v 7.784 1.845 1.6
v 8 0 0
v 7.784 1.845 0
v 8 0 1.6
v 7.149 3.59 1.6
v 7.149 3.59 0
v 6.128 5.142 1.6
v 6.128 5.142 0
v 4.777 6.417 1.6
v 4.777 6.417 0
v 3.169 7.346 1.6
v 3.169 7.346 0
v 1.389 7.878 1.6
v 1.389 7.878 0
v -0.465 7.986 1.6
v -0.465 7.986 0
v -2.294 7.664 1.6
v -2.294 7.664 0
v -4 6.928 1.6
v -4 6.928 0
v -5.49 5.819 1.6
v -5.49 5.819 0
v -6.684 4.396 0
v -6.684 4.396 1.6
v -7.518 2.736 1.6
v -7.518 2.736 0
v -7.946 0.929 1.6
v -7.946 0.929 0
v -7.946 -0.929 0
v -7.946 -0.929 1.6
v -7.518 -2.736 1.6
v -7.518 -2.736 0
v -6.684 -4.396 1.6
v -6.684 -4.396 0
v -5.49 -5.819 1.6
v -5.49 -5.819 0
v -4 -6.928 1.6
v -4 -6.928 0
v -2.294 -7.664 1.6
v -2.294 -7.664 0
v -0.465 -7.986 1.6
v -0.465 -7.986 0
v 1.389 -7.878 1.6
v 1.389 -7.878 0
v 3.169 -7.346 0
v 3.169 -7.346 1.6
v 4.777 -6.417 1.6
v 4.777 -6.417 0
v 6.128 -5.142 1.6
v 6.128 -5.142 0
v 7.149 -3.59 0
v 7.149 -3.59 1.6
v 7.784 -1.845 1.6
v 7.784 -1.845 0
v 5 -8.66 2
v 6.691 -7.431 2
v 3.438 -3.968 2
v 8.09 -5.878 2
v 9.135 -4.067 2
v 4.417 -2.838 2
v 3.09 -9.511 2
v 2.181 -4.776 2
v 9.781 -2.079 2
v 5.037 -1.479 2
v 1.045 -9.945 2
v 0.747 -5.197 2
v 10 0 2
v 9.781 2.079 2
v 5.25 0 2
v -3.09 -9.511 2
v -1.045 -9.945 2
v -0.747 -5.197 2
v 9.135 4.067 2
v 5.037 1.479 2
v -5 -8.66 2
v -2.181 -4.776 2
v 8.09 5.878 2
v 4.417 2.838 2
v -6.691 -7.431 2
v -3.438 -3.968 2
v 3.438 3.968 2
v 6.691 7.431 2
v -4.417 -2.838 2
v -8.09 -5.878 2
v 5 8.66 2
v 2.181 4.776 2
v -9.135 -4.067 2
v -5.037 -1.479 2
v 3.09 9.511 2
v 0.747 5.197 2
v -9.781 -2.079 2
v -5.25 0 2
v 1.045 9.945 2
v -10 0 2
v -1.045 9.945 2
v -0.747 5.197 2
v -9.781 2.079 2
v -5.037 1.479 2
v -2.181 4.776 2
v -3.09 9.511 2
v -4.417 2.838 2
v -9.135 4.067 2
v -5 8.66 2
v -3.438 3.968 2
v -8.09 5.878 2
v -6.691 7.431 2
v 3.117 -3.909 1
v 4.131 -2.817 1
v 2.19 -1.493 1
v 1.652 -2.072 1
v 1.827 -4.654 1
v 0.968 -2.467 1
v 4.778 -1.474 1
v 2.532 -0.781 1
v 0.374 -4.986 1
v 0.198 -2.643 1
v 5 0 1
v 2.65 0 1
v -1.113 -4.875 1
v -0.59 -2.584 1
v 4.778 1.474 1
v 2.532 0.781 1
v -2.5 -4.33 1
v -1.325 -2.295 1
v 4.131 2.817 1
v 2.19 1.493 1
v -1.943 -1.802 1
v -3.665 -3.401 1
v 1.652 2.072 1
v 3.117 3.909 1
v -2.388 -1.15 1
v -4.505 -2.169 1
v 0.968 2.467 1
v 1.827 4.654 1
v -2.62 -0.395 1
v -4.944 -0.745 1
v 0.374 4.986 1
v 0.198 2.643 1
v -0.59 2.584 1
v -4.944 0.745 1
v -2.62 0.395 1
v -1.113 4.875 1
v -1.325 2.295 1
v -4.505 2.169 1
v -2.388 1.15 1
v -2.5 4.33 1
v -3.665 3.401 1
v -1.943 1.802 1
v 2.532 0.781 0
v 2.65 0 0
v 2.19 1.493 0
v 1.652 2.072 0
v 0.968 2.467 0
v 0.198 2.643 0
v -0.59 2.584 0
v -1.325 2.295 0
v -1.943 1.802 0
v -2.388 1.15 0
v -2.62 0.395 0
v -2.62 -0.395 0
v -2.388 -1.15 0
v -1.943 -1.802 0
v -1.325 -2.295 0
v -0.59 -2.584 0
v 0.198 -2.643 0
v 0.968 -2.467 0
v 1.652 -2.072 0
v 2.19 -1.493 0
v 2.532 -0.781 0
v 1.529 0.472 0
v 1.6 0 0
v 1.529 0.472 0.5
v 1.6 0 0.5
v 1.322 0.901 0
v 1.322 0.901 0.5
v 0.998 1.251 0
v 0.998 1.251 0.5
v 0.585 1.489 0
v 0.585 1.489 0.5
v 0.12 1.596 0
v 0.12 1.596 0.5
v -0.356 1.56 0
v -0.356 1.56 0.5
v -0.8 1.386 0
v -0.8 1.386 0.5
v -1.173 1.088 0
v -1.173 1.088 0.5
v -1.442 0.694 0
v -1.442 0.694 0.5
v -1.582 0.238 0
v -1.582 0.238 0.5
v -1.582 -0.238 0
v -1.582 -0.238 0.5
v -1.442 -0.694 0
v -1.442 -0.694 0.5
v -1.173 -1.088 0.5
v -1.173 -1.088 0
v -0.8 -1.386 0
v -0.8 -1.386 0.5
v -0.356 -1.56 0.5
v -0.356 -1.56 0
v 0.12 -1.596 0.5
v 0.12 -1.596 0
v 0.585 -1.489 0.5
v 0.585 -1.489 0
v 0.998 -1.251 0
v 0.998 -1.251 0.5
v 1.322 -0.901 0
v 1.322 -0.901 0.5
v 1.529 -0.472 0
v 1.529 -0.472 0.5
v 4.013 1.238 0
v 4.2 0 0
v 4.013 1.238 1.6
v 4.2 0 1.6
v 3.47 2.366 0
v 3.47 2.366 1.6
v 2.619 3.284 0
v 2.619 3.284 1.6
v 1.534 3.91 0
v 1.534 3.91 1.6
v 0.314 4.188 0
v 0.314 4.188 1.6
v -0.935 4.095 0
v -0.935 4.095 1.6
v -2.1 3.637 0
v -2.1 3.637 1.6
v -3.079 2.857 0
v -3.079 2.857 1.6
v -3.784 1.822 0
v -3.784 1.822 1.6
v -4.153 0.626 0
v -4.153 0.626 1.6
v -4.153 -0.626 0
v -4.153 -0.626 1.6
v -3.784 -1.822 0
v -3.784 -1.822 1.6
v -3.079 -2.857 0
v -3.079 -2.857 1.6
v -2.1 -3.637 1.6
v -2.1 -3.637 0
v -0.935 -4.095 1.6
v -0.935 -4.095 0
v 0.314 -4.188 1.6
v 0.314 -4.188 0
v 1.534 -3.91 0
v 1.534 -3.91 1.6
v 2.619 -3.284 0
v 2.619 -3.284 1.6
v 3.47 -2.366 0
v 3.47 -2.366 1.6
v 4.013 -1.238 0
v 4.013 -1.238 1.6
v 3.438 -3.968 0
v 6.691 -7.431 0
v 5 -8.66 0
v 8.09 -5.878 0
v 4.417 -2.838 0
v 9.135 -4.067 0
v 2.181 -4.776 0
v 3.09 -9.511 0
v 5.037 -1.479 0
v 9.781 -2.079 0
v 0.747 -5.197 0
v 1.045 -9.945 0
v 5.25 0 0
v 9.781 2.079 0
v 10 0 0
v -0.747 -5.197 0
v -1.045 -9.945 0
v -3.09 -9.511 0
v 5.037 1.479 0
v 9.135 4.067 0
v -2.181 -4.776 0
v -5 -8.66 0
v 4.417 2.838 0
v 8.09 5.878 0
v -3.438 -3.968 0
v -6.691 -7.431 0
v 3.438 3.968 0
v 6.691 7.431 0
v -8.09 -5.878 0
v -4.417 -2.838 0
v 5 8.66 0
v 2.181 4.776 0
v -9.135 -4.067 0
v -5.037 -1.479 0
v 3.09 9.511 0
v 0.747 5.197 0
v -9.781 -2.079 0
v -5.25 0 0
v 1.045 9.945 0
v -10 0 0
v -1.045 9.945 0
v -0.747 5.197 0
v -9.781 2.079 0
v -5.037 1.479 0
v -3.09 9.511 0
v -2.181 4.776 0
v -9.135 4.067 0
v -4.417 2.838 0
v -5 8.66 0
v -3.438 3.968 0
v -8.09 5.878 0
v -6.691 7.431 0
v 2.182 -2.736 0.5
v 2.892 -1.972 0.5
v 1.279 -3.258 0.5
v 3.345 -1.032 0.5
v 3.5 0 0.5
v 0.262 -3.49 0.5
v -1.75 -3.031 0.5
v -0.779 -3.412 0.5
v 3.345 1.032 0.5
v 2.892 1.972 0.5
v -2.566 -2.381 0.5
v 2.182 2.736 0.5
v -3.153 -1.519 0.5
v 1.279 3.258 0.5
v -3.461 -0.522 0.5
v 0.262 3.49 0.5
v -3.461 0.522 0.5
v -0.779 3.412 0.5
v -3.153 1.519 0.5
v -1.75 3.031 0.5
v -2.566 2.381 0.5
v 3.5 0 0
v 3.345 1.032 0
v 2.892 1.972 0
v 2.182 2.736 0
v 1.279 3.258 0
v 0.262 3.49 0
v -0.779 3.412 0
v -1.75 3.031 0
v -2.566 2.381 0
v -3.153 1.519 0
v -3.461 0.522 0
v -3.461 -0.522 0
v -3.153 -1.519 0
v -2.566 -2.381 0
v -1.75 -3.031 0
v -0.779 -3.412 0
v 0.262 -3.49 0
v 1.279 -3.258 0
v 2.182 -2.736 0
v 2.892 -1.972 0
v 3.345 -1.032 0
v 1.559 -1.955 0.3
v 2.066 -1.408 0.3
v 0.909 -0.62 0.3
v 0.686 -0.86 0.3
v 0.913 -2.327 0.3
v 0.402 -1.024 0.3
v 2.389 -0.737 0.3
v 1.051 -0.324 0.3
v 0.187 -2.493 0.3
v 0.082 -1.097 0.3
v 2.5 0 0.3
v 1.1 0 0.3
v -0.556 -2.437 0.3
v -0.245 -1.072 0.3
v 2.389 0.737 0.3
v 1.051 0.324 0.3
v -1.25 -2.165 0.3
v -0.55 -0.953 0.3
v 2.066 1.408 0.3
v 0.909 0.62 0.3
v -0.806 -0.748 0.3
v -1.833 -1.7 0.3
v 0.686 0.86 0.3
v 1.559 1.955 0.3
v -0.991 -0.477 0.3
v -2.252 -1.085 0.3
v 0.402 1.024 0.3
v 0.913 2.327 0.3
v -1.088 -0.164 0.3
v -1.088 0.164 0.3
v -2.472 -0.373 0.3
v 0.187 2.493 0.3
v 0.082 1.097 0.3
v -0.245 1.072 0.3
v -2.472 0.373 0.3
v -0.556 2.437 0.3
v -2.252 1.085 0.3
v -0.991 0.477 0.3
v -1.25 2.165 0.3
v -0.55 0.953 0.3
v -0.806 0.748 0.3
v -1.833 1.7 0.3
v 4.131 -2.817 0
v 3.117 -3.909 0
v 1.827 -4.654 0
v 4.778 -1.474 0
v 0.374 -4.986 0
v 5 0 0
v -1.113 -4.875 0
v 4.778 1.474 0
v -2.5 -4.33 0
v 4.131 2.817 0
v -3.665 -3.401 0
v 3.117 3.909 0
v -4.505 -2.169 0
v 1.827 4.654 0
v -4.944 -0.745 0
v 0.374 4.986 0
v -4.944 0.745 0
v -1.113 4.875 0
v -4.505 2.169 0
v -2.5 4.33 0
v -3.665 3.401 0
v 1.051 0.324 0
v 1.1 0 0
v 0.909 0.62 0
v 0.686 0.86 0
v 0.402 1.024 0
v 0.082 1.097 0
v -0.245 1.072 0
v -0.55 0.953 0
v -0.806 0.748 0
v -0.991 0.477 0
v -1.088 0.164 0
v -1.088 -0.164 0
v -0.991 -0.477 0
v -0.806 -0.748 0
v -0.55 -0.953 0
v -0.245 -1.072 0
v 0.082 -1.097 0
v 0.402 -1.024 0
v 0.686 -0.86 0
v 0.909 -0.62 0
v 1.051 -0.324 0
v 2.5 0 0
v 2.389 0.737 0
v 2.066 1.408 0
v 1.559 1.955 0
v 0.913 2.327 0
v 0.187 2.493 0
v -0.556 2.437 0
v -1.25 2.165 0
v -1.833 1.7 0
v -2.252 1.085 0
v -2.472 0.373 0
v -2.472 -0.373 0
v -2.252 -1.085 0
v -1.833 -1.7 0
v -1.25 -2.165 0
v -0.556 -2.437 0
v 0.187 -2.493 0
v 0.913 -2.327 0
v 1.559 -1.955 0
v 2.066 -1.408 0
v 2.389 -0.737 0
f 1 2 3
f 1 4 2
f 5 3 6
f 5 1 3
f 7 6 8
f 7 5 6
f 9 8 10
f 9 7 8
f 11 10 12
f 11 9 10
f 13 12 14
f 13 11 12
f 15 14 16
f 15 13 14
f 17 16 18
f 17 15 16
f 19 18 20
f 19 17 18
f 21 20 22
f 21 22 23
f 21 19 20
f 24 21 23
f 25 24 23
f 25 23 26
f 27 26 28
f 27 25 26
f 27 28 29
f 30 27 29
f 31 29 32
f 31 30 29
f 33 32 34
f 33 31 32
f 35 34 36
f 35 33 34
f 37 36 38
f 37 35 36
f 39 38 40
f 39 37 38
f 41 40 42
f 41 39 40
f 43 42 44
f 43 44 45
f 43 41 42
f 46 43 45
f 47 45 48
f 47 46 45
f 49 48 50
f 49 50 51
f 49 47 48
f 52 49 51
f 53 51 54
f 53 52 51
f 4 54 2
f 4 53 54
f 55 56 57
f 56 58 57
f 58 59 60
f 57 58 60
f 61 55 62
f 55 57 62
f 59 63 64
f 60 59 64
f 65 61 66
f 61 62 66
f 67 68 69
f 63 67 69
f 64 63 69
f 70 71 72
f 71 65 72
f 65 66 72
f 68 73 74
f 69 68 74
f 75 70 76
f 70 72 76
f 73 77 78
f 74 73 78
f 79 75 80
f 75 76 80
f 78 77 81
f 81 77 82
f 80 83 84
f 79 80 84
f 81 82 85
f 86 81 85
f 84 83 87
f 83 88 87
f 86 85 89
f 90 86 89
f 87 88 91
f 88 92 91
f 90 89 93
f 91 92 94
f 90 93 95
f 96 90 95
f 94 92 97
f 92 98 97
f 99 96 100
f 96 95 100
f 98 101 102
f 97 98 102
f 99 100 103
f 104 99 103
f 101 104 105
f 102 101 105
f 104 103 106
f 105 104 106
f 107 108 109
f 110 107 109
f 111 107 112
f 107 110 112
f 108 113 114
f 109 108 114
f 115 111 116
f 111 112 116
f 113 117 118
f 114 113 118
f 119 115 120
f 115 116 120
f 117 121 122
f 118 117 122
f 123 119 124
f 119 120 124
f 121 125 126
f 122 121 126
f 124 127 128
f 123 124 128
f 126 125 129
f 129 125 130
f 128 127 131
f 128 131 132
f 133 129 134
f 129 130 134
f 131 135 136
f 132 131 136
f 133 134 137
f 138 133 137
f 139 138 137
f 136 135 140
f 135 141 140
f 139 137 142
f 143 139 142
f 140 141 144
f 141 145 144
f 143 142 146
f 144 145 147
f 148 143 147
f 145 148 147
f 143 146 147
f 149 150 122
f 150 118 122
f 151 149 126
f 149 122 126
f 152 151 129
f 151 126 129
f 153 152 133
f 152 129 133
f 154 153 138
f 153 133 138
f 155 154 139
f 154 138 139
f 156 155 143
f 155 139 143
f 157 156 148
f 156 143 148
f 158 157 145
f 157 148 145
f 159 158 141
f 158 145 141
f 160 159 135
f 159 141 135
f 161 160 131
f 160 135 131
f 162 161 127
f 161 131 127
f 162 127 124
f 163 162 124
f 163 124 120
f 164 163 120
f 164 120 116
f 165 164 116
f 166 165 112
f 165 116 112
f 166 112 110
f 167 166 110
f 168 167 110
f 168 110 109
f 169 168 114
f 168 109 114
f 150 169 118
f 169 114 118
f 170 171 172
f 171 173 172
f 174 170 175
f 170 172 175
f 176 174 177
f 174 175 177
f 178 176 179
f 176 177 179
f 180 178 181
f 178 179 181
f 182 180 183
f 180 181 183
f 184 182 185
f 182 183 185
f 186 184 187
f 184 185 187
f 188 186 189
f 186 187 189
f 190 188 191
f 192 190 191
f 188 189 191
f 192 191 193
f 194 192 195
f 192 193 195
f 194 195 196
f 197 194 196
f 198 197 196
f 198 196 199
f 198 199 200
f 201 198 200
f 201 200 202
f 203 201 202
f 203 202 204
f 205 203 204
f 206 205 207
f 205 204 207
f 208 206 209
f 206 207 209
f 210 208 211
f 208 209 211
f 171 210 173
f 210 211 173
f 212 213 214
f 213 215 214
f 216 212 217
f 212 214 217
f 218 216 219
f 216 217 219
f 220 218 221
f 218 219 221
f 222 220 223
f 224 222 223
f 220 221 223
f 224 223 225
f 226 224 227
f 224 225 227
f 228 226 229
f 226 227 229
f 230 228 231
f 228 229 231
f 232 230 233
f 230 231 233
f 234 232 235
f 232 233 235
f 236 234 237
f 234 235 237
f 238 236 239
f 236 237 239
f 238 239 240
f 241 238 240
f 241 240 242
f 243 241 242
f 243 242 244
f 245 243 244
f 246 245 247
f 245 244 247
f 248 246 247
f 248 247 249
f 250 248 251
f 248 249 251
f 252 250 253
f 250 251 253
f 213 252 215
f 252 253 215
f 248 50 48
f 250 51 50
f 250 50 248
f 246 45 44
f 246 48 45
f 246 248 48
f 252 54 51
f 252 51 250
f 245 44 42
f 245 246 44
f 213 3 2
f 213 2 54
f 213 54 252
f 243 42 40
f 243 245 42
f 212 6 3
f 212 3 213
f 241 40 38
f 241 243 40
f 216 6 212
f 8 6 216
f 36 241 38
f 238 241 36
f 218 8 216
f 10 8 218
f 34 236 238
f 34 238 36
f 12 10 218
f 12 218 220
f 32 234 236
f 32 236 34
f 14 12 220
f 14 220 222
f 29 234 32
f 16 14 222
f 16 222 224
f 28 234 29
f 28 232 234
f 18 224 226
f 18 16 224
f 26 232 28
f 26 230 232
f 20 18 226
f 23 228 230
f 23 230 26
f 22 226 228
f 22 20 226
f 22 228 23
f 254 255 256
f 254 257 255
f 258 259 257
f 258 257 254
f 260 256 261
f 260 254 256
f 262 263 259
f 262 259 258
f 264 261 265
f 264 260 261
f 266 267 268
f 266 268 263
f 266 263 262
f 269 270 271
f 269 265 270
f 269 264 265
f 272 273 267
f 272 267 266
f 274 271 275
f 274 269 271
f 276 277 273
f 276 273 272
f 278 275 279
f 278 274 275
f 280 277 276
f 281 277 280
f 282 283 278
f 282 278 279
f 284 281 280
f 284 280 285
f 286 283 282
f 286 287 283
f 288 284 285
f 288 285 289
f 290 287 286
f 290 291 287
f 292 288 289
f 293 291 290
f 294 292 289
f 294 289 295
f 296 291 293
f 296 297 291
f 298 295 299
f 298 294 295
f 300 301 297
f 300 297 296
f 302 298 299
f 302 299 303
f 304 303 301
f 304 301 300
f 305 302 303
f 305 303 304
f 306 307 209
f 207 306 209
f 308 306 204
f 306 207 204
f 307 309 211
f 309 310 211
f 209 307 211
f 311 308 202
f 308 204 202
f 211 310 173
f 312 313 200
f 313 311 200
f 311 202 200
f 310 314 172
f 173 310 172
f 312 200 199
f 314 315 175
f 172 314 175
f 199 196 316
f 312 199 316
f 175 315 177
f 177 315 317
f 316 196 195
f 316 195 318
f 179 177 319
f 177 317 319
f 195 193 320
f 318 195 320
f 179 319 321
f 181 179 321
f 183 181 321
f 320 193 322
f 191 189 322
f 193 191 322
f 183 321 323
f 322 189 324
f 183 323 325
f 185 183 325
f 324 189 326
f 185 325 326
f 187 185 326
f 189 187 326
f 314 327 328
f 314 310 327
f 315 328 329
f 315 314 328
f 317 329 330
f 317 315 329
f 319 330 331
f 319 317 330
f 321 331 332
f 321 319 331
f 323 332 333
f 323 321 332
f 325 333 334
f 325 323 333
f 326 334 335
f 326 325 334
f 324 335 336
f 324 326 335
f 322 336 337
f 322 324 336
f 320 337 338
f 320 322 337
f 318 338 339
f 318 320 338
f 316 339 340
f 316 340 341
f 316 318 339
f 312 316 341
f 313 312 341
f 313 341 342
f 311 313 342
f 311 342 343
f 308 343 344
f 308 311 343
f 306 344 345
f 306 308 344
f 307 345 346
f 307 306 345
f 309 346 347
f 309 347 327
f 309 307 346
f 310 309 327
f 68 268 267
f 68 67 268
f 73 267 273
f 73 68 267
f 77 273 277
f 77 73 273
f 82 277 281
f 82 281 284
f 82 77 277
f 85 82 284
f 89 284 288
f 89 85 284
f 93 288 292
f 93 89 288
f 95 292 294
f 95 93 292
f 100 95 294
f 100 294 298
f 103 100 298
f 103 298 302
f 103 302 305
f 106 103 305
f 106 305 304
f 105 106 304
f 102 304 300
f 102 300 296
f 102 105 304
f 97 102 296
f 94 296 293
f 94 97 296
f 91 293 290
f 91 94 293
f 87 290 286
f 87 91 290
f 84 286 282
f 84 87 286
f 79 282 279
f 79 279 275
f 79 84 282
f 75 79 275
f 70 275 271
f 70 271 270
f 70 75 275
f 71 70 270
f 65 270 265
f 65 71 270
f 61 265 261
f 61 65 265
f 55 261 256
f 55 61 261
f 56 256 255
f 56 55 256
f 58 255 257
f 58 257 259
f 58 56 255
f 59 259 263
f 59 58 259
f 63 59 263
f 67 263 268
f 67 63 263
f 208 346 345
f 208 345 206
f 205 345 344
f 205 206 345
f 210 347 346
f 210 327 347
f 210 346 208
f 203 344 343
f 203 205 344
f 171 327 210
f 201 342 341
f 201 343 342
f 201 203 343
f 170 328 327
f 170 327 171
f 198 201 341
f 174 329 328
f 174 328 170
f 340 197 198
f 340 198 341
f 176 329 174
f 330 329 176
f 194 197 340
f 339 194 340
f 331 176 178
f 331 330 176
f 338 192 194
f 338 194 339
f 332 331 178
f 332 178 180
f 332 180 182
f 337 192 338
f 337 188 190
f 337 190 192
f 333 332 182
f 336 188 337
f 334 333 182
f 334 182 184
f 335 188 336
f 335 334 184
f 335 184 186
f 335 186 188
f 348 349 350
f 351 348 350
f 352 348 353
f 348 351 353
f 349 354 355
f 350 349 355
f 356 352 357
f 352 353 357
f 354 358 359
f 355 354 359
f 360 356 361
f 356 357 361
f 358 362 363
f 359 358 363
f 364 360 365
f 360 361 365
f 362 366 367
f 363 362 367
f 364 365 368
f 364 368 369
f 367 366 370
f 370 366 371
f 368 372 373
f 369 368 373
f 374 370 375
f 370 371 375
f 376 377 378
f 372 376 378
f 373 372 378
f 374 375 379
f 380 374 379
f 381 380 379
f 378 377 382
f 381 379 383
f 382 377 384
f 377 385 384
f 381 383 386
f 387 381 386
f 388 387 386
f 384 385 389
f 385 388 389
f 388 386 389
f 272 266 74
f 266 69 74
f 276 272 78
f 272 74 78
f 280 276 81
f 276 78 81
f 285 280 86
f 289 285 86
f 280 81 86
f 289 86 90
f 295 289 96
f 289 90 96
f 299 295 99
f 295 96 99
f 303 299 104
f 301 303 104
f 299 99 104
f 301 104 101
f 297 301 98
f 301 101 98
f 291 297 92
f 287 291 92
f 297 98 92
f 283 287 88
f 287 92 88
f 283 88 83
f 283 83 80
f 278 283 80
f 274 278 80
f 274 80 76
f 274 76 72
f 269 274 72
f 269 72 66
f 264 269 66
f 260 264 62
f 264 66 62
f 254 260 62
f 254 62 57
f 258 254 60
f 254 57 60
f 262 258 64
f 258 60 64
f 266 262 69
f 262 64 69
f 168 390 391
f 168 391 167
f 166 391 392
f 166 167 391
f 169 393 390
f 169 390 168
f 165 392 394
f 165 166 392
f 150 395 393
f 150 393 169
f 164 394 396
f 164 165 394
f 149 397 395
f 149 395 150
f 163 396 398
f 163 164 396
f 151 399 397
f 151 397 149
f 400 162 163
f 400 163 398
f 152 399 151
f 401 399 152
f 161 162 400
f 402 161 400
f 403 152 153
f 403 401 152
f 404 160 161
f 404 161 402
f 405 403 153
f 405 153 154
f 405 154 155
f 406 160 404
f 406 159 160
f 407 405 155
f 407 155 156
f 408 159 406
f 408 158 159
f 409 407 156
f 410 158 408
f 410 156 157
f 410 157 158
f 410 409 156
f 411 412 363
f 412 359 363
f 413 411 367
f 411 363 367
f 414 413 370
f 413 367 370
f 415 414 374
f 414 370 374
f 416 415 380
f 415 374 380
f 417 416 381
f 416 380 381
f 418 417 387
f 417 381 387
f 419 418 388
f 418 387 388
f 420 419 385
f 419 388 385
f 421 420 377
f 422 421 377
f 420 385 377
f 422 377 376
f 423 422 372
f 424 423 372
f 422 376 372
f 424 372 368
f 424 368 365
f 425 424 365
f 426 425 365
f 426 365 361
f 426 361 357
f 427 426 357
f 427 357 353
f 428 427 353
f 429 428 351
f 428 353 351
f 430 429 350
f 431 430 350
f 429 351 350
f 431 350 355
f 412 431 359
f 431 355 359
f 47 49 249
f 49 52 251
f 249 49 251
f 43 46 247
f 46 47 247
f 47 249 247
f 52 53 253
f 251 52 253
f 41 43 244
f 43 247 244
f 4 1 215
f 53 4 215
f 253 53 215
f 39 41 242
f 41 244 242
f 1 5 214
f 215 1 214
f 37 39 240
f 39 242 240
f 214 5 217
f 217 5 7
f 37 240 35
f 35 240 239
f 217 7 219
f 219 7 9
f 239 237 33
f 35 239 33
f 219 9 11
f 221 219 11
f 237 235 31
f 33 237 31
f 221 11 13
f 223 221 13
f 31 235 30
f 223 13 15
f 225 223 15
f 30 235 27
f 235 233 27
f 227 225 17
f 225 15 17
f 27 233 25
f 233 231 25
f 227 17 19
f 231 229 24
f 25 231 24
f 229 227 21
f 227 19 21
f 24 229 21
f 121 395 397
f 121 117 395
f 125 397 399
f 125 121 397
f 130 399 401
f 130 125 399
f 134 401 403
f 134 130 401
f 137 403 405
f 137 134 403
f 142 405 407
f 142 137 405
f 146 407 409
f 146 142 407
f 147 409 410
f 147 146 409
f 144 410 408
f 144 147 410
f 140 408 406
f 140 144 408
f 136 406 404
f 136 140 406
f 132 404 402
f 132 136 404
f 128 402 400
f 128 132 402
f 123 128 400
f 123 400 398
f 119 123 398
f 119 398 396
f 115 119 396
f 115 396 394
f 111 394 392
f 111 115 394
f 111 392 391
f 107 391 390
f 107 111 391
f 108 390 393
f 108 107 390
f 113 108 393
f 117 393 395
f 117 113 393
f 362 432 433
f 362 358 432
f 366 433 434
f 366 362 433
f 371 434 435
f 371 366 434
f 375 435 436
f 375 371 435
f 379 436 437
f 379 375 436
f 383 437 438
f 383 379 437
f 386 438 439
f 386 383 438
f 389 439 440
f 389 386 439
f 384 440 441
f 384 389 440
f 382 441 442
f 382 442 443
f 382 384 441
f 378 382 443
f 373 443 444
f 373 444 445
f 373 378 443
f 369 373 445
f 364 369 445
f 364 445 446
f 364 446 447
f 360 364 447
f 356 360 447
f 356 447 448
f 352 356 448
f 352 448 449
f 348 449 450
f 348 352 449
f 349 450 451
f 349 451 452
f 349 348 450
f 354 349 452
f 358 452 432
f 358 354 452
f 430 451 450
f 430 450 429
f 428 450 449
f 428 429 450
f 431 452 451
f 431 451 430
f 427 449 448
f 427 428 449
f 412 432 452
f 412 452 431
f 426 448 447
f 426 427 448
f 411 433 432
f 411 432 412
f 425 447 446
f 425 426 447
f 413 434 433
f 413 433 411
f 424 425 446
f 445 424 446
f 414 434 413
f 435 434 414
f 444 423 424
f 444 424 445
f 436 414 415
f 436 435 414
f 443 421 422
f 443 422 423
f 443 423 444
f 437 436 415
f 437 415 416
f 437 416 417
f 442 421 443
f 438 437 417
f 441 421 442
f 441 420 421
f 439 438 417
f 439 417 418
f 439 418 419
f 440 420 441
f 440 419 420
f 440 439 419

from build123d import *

# Parameters (mm, degrees)
F0_W = 1.9
F0_H = 0.5
F2_W = 2.35
F2_H = 1
F4_W = 3.8
F4_H = 1.6
F6_W = 4.75
F6_H = 2
F8_W = 1.4
F8_H = 0.3


with BuildPart() as f1:
    # F0 (on Front) → F1 (revolve)
    with BuildSketch(Plane.XZ):
        with Locations((2.55, 0.25)):
            Rectangle(F0_W, F0_H)
    revolve(axis=Axis((0, 0, 1.23983), (0, 0, 1)))


with BuildPart() as f3:
    # F2 (on Front) → F3 (revolve)
    with BuildSketch(Plane.XZ):
        with Locations((3.825, 0.5)):
            Rectangle(F2_W, F2_H)
    revolve(axis=Axis((0, 0, 1.906276), (0, 0, 1)))


with BuildPart() as f5:
    # F4 (on Front) → F5 (revolve)
    with BuildSketch(Plane.XZ):
        with Locations((6.1, 0.8)):
            Rectangle(F4_W, F4_H)
    revolve(axis=Axis((0, 0, 1.491251), (0, 0, 1)))


with BuildPart() as f7:
    # F6 (on Front) → F7 (revolve)
    with BuildSketch(Plane.XZ):
        with Locations((7.625, 1)):
            Rectangle(F6_W, F6_H)
    revolve(axis=Axis((0, 0, 6.946455), (0, 0, 1)))


with BuildPart() as f9:
    # F8 (on Front) → F9 (revolve)
    with BuildSketch(Plane.XZ):
        with Locations((1.8, 0.15)):
            Rectangle(F8_W, F8_H)
    revolve(axis=Axis((0, 0, 0.487175), (0, 0, 1)))


solid = Compound([f1.part, f3.part, f5.part, f7.part, f9.part])
